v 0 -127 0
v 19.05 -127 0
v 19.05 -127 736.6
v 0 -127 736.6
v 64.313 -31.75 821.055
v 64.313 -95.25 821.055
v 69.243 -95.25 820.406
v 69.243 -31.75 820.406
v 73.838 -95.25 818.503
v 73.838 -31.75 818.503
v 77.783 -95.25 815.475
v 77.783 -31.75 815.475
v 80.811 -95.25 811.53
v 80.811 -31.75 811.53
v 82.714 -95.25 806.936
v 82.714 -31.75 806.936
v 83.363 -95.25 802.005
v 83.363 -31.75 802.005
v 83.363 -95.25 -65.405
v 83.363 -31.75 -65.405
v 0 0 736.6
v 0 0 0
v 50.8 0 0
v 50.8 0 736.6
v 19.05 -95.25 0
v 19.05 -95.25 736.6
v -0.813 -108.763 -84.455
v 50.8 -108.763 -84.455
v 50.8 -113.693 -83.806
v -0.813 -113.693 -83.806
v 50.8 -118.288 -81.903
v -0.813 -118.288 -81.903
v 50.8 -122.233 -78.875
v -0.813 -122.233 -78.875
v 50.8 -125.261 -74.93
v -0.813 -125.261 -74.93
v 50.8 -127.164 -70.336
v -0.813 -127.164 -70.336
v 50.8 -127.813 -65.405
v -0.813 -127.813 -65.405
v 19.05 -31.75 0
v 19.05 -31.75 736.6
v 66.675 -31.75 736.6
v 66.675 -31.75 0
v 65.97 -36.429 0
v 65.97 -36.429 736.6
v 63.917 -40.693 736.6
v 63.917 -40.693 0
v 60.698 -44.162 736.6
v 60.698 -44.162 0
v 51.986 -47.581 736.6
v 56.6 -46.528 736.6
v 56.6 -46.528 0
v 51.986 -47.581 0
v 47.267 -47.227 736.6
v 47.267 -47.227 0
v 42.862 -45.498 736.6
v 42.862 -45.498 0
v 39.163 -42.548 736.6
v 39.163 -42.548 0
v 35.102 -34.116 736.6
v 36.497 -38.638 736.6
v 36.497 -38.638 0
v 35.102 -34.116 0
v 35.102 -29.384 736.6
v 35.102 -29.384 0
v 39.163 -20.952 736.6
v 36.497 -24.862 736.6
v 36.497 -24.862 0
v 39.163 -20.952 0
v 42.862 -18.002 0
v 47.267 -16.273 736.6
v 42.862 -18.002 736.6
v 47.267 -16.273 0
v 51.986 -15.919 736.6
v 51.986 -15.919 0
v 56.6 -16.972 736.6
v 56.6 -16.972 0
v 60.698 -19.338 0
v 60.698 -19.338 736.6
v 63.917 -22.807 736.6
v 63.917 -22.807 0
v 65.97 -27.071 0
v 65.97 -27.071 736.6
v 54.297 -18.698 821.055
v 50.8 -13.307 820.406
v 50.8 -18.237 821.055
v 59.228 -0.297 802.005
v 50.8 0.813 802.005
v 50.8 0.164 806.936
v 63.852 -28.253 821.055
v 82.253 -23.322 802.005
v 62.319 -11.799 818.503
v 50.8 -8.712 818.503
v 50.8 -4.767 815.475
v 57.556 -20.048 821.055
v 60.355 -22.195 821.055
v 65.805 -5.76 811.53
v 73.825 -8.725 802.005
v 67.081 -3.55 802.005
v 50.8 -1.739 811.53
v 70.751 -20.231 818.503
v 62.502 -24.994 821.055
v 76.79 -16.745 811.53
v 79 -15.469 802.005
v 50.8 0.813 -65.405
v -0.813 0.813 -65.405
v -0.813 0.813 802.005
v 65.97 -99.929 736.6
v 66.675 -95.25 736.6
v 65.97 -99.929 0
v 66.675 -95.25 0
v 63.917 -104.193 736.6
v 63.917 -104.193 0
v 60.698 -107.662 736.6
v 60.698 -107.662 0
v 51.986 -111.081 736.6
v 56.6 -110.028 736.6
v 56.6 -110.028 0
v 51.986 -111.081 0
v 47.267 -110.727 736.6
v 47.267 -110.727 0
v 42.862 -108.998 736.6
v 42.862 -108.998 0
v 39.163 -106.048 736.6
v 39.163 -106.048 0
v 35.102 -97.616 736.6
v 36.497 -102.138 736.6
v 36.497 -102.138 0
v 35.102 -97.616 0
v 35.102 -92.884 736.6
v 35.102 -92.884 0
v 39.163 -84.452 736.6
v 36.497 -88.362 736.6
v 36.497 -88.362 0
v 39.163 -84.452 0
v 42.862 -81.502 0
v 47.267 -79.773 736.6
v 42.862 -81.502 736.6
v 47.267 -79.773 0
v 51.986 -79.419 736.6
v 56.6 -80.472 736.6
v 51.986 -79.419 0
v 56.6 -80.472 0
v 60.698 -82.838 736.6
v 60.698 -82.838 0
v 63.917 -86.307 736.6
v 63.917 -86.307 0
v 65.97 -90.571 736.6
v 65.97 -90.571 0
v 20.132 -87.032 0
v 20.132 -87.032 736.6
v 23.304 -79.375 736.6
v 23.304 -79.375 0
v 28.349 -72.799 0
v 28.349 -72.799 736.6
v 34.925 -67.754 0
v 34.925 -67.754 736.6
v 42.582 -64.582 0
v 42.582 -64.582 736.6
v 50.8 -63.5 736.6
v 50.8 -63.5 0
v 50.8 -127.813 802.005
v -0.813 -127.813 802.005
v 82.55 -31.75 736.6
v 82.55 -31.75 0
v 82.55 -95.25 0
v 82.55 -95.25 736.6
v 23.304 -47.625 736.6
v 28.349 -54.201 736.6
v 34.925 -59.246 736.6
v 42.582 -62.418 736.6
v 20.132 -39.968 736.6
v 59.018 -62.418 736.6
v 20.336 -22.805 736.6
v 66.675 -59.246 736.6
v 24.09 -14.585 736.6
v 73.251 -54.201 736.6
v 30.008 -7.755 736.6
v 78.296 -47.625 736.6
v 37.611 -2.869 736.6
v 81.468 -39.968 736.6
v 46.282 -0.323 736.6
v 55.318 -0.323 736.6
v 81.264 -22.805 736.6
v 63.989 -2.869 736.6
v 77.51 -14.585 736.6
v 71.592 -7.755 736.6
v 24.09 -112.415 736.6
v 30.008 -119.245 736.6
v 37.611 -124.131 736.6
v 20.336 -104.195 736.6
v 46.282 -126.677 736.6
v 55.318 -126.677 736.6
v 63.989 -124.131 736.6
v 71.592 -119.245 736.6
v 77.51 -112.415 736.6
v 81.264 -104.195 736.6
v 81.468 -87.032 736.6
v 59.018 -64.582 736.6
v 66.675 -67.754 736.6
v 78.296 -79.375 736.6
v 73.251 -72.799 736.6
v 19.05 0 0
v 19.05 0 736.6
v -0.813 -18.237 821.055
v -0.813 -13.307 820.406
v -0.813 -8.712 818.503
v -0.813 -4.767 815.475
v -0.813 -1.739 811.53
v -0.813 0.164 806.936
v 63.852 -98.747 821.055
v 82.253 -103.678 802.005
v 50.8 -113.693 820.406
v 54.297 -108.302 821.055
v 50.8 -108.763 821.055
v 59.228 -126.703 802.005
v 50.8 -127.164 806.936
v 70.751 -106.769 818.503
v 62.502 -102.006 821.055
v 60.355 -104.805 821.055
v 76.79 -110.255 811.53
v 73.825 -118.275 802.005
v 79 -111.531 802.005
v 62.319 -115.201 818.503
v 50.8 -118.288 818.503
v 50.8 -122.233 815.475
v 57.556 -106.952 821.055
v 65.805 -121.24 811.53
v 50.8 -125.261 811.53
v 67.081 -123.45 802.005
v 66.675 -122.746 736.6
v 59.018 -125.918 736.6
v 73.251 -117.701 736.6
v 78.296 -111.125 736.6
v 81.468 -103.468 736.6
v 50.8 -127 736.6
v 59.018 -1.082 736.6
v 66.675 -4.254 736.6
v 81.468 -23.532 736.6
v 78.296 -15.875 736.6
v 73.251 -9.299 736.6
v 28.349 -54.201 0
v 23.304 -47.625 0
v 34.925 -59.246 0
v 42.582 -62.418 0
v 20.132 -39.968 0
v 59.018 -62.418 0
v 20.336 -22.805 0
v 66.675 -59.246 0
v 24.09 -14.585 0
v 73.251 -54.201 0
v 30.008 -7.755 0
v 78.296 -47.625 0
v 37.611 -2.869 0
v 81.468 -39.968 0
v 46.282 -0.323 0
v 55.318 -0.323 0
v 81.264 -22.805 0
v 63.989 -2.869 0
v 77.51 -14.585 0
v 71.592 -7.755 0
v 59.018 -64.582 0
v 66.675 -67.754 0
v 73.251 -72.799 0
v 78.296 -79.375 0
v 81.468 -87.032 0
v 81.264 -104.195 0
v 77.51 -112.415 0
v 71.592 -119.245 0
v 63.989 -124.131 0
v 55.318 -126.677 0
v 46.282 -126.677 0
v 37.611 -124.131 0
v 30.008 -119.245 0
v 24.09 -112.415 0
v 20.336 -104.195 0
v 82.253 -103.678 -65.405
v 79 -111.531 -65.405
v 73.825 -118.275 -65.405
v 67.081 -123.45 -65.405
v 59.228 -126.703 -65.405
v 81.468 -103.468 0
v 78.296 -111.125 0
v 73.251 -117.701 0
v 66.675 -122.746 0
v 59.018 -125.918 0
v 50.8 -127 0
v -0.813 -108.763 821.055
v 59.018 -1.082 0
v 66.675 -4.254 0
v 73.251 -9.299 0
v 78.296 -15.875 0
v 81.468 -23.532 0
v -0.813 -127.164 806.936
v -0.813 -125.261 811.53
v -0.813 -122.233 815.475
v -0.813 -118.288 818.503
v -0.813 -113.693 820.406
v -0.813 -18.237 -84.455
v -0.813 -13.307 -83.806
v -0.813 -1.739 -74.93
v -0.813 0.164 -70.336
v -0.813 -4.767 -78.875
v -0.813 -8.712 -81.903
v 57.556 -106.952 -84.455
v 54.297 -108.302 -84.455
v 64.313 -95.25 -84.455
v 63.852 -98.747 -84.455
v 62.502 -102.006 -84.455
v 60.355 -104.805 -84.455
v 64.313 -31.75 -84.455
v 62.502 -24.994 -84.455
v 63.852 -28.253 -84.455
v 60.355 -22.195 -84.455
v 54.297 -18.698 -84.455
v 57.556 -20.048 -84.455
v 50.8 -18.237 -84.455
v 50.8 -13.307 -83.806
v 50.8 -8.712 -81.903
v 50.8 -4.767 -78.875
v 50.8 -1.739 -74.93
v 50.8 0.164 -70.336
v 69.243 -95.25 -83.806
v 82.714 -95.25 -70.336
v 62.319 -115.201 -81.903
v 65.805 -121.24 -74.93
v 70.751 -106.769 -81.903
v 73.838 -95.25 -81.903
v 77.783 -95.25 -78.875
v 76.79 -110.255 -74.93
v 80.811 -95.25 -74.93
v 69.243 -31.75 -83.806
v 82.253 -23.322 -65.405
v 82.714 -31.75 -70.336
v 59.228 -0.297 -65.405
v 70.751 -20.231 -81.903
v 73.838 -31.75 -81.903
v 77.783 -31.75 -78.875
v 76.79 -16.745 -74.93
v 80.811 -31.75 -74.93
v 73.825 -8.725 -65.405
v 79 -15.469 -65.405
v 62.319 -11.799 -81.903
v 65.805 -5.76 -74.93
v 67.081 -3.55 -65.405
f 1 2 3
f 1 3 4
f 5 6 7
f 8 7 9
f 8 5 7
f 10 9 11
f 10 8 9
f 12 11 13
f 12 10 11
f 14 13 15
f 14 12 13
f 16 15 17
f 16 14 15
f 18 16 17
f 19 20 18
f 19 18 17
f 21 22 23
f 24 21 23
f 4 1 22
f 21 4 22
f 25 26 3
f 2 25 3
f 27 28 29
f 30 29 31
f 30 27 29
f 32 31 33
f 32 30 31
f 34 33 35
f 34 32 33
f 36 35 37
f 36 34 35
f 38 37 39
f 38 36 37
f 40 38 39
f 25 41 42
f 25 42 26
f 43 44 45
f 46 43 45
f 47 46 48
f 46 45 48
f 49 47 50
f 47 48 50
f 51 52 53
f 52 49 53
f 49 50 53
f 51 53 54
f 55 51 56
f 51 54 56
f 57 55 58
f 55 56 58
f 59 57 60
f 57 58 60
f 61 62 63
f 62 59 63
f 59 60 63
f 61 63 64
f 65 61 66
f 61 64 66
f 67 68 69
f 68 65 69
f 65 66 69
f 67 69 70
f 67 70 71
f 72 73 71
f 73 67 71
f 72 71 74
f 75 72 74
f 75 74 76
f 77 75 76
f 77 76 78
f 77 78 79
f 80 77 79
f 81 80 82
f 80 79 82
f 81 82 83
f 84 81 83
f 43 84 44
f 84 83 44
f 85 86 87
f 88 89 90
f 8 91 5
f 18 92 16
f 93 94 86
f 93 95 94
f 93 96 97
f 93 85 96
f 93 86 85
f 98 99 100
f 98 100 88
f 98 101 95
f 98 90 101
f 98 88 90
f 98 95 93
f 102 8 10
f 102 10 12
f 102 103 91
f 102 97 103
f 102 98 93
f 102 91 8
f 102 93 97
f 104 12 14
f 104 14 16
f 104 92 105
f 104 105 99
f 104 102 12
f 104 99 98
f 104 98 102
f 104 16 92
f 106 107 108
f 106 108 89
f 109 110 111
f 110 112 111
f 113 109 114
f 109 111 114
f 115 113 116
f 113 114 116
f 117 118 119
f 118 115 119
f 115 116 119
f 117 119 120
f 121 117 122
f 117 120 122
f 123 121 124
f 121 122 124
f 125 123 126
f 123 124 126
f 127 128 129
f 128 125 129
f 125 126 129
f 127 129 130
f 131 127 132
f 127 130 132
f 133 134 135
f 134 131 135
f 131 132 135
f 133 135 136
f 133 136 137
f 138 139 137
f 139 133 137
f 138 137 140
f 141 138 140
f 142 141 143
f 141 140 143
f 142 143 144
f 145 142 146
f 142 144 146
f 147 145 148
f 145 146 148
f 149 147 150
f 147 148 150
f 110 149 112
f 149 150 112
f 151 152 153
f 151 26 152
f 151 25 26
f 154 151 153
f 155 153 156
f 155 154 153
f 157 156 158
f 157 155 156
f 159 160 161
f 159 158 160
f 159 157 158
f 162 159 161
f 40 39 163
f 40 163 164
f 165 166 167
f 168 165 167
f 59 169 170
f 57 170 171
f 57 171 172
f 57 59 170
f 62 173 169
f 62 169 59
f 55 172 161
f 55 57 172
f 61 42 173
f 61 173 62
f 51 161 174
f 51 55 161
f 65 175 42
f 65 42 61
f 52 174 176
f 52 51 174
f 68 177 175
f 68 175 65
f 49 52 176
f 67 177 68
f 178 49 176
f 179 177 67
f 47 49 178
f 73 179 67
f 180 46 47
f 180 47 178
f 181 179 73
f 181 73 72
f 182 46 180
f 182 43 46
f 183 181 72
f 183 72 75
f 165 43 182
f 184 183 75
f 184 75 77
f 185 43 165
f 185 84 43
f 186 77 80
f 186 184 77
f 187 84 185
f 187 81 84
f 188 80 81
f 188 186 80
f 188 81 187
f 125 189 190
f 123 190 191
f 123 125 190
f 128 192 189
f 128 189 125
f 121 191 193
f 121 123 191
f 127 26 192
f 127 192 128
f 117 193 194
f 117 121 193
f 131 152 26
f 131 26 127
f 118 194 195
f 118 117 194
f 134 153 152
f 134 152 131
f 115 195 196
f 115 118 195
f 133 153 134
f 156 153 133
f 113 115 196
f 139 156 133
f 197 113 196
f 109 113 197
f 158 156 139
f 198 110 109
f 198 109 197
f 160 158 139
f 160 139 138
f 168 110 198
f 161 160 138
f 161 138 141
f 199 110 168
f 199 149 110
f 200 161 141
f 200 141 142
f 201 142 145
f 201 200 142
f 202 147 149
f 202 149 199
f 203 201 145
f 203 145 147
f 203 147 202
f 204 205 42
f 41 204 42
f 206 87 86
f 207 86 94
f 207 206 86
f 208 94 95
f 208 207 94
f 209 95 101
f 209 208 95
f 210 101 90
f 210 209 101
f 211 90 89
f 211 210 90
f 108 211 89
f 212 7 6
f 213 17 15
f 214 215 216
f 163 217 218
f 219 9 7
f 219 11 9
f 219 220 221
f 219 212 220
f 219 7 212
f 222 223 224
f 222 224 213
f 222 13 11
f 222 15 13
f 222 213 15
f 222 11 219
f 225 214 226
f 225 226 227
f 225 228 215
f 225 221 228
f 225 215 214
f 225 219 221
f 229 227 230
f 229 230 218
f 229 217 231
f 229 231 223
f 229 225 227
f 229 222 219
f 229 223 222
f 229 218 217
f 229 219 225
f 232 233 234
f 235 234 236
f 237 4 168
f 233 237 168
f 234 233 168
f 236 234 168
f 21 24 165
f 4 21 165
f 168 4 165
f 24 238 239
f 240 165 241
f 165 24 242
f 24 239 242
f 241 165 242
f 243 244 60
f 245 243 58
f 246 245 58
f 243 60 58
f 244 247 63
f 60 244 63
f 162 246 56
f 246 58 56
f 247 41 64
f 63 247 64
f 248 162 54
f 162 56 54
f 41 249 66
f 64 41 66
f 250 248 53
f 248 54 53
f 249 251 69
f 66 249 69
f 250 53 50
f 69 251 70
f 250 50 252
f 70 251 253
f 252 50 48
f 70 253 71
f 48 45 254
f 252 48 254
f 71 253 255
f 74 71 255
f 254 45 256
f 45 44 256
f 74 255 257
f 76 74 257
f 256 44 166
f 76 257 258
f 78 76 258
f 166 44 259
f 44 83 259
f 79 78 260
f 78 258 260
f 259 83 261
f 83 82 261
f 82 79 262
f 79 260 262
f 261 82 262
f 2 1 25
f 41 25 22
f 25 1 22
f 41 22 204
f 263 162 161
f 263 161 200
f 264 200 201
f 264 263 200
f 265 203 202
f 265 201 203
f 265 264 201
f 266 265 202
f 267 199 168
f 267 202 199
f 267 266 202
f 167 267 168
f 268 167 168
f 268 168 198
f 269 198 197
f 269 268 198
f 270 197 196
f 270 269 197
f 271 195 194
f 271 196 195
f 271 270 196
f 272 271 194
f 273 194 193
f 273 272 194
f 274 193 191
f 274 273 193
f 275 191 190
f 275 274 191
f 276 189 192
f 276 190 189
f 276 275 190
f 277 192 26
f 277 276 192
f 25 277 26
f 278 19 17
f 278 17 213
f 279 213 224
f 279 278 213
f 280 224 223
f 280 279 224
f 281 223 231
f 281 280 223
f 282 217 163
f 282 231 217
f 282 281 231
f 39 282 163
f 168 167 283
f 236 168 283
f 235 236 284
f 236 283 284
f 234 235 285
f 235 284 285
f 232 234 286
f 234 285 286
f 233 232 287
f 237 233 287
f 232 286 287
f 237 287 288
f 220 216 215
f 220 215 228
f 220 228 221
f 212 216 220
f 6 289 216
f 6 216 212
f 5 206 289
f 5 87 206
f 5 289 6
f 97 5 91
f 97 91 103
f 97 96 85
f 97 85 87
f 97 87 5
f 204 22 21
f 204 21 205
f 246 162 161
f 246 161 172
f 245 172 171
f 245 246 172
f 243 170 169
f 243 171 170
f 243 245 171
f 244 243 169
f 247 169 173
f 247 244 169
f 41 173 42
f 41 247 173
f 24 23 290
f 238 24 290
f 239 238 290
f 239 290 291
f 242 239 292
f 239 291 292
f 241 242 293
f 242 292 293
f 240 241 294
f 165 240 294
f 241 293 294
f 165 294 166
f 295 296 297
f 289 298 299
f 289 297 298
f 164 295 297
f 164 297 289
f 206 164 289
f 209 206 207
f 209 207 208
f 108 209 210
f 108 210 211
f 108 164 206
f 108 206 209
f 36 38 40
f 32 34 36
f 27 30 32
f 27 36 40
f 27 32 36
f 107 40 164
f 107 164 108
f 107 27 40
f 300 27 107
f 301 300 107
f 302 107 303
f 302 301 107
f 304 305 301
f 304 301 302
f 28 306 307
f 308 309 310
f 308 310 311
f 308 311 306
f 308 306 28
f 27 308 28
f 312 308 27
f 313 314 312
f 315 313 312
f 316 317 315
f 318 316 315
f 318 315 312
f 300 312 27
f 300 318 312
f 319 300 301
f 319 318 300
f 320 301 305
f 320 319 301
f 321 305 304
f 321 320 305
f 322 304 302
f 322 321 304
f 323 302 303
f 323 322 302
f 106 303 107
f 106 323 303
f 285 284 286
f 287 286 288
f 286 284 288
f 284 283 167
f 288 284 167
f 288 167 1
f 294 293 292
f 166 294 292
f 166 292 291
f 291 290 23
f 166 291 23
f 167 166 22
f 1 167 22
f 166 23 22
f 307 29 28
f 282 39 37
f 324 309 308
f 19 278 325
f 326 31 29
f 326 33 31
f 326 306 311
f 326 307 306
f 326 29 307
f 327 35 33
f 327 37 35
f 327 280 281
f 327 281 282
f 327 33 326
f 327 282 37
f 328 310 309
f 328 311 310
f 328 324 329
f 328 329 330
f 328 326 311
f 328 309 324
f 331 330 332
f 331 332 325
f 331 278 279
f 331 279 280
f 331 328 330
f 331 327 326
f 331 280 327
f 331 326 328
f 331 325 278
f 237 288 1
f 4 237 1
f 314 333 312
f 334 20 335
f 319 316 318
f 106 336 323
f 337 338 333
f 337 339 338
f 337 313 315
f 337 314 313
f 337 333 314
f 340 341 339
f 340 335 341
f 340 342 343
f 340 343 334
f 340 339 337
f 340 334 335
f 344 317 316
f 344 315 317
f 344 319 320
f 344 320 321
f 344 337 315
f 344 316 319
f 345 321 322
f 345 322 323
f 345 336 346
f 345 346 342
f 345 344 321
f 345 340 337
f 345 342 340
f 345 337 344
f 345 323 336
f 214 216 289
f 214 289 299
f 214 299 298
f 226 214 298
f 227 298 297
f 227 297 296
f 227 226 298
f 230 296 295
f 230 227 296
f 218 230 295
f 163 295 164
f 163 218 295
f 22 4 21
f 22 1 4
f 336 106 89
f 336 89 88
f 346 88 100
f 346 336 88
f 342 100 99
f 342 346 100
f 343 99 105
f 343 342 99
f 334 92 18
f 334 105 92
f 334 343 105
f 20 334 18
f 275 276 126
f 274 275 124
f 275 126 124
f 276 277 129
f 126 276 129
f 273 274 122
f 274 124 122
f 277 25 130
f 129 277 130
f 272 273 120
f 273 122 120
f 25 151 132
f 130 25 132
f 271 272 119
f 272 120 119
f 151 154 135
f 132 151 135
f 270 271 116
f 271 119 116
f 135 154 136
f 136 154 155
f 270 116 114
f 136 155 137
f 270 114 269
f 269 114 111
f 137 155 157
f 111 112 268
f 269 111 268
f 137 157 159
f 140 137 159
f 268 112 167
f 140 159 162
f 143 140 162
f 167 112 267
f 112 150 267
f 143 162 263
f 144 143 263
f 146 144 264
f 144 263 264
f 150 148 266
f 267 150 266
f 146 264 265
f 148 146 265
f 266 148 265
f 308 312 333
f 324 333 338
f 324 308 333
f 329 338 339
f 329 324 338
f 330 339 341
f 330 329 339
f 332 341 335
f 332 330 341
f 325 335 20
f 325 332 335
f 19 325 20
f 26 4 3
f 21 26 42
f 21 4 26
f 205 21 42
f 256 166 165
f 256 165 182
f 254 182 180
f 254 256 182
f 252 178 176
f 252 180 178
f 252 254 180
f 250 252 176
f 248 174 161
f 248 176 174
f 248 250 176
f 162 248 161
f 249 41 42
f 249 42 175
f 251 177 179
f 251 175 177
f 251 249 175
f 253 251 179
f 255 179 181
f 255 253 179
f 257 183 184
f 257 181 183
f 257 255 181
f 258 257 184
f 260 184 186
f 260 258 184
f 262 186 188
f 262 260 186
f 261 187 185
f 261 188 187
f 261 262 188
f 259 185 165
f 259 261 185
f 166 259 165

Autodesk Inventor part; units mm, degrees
ref_plane "YZ Plane" through (0, 0, 0) normal (1, 0, 0) x (0, 1, 0)
ref_plane "XZ Plane" through (0, 0, 0) normal (0, 1, 0) x (-1, 0, 0)
ref_plane "XY Plane" through (0, 0, 0) normal (0, 0, 1) x (1, 0, 0)
sketch "Sketch1" plane through (0, 0, 0) normal (0, 0, 1) x (1, 0, 0)
  line L0 (0, 0) -> (19.05, 0)
  line L1 (19.05, 0) -> (19.05, -127)
  line L2 (19.05, -127) -> (0, -127)
  line L3 (0, -127) -> (0, 0)
  circle A0 centre (50.8, -31.75) radius 31.75
  circle A1 centre (50.8, -31.75) radius 15.875
  circle A2 centre (50.8, -95.25) radius 15.875
  circle A3 centre (50.8, -95.25) radius 31.75
  dimension "d0" = 19.05
  dimension "d1" = 127
  dimension "d2" = 31.75
extrude "Extrusion1" add sketch "Sketch1" along normal blind 736.6 contours L0 L1 L2 L3
extrude "Extrusion2" add sketch "Sketch1" along normal up to surface (736.6 mm away) separate body contours A0 | A3
sketch "Sketch2" plane through (0, 0, 0) normal (0, 0, -1) x (-1, 0, 0)
  line L0 (-19.05, -127) -> (0, -127) projected
  line L1 (0, -127) -> (0, 0) projected
  line L2 (0, 0) -> (-50.8, 0)
  circle A0 centre (-50.8, -31.75) radius 31.75 projected
  line L3 (0, 0) -> (0, -127) projected
  line L4 (0, 0) -> (0, -127)
  line L5 (0, -127) -> (-50.8, -127)
  circle A1 centre (-50.8, -95.25) radius 31.75 projected
  arc A2 (-82.55, -95.25) -> (-50.8, -127) centre (-50.8, -95.25) ccw
  arc A3 (-50.8, 0) -> (-82.55, -31.75) centre (-50.8, -31.75) ccw
  line L6 (-82.55, -31.75) -> (-82.55, -95.25)
  arc A4 (-83.3628, -95.25) -> (-50.8, -127.8128) centre (-50.8, -95.25) ccw
  line L7 (-50.8, -127.8128) -> (0.8128, -127.8128)
  line L8 (0.8128, -127.8128) -> (0.8128, 0.8128)
  line L9 (0.8128, 0.8128) -> (-50.8, 0.8128)
  arc A5 (-50.8, 0.8128) -> (-83.3628, -31.75) centre (-50.8, -31.75) ccw
  line L10 (-83.3628, -31.75) -> (-83.3628, -95.25)
  point P0 (-50.8, -63.5)
  dimension "d7" = 0.8128
extrude "Extrusion3" add sketch "Sketch2" against normal up to surface (736.6 mm away) separate body
sketch "Sketch3" plane through (0, 0, 0) normal (0, 0, -1) x (-1, 0, 0)
  arc A0 (-83.3628, -95.25) -> (-50.8, -127.8128) centre (-50.8, -95.25) ccw projected
  line L0 (-50.8, -127.8128) -> (0.8128, -127.8128) projected
  line L1 (0.8128, -127.8128) -> (0.8128, 0.8128) projected
  line L2 (0.8128, 0.8128) -> (-50.8, 0.8128) projected
  arc A1 (-50.8, 0.8128) -> (-83.3628, -31.75) centre (-50.8, -31.75) ccw projected
  line L3 (-83.3628, -31.75) -> (-83.3628, -95.25) projected
extrude "Extrusion4" add sketch "Sketch3" along normal blind 84.455 bodies 3
sketch "Sketch5" plane through (-0.8128, -127.8128, 736.6) normal (0, 0, 1) x (1, 0, 0)
  line L0 (51.6128, 0) -> (0, 0) projected
  arc A0 (51.6128, 0) -> (84.1756, 32.5628) centre (51.6128, 32.5628) ccw projected
  line L1 (84.1756, 96.0628) -> (84.1756, 32.5628) projected
  arc A1 (84.1756, 96.0628) -> (51.6128, 128.6256) centre (51.6128, 96.0628) ccw projected
  line L2 (0, 128.6256) -> (51.6128, 128.6256) projected
  line L3 (0, 0) -> (0, 128.6256) projected
extrude "Extrusion5" add sketch "Sketch5" along normal blind 84.455 bodies 3
fillet "Fillet1" radius 19.05 10 edges at (73.8254, -8.7246, 821.055) (83.3628, -63.5, 821.055) (73.8254, -118.2754, 821.055) (24.9936, -127.8128, 821.055) (24.9936, 0.8128, 821.055) (73.8254, -8.7246, -84.455) (83.3628, -63.5, -84.455) (73.8254, -118.2754, -84.455) (24.9936, -127.8128, -84.455) (24.9936, 0.8128, -84.455)
properties part number "FBBumper" material "Wood (Birch)"
